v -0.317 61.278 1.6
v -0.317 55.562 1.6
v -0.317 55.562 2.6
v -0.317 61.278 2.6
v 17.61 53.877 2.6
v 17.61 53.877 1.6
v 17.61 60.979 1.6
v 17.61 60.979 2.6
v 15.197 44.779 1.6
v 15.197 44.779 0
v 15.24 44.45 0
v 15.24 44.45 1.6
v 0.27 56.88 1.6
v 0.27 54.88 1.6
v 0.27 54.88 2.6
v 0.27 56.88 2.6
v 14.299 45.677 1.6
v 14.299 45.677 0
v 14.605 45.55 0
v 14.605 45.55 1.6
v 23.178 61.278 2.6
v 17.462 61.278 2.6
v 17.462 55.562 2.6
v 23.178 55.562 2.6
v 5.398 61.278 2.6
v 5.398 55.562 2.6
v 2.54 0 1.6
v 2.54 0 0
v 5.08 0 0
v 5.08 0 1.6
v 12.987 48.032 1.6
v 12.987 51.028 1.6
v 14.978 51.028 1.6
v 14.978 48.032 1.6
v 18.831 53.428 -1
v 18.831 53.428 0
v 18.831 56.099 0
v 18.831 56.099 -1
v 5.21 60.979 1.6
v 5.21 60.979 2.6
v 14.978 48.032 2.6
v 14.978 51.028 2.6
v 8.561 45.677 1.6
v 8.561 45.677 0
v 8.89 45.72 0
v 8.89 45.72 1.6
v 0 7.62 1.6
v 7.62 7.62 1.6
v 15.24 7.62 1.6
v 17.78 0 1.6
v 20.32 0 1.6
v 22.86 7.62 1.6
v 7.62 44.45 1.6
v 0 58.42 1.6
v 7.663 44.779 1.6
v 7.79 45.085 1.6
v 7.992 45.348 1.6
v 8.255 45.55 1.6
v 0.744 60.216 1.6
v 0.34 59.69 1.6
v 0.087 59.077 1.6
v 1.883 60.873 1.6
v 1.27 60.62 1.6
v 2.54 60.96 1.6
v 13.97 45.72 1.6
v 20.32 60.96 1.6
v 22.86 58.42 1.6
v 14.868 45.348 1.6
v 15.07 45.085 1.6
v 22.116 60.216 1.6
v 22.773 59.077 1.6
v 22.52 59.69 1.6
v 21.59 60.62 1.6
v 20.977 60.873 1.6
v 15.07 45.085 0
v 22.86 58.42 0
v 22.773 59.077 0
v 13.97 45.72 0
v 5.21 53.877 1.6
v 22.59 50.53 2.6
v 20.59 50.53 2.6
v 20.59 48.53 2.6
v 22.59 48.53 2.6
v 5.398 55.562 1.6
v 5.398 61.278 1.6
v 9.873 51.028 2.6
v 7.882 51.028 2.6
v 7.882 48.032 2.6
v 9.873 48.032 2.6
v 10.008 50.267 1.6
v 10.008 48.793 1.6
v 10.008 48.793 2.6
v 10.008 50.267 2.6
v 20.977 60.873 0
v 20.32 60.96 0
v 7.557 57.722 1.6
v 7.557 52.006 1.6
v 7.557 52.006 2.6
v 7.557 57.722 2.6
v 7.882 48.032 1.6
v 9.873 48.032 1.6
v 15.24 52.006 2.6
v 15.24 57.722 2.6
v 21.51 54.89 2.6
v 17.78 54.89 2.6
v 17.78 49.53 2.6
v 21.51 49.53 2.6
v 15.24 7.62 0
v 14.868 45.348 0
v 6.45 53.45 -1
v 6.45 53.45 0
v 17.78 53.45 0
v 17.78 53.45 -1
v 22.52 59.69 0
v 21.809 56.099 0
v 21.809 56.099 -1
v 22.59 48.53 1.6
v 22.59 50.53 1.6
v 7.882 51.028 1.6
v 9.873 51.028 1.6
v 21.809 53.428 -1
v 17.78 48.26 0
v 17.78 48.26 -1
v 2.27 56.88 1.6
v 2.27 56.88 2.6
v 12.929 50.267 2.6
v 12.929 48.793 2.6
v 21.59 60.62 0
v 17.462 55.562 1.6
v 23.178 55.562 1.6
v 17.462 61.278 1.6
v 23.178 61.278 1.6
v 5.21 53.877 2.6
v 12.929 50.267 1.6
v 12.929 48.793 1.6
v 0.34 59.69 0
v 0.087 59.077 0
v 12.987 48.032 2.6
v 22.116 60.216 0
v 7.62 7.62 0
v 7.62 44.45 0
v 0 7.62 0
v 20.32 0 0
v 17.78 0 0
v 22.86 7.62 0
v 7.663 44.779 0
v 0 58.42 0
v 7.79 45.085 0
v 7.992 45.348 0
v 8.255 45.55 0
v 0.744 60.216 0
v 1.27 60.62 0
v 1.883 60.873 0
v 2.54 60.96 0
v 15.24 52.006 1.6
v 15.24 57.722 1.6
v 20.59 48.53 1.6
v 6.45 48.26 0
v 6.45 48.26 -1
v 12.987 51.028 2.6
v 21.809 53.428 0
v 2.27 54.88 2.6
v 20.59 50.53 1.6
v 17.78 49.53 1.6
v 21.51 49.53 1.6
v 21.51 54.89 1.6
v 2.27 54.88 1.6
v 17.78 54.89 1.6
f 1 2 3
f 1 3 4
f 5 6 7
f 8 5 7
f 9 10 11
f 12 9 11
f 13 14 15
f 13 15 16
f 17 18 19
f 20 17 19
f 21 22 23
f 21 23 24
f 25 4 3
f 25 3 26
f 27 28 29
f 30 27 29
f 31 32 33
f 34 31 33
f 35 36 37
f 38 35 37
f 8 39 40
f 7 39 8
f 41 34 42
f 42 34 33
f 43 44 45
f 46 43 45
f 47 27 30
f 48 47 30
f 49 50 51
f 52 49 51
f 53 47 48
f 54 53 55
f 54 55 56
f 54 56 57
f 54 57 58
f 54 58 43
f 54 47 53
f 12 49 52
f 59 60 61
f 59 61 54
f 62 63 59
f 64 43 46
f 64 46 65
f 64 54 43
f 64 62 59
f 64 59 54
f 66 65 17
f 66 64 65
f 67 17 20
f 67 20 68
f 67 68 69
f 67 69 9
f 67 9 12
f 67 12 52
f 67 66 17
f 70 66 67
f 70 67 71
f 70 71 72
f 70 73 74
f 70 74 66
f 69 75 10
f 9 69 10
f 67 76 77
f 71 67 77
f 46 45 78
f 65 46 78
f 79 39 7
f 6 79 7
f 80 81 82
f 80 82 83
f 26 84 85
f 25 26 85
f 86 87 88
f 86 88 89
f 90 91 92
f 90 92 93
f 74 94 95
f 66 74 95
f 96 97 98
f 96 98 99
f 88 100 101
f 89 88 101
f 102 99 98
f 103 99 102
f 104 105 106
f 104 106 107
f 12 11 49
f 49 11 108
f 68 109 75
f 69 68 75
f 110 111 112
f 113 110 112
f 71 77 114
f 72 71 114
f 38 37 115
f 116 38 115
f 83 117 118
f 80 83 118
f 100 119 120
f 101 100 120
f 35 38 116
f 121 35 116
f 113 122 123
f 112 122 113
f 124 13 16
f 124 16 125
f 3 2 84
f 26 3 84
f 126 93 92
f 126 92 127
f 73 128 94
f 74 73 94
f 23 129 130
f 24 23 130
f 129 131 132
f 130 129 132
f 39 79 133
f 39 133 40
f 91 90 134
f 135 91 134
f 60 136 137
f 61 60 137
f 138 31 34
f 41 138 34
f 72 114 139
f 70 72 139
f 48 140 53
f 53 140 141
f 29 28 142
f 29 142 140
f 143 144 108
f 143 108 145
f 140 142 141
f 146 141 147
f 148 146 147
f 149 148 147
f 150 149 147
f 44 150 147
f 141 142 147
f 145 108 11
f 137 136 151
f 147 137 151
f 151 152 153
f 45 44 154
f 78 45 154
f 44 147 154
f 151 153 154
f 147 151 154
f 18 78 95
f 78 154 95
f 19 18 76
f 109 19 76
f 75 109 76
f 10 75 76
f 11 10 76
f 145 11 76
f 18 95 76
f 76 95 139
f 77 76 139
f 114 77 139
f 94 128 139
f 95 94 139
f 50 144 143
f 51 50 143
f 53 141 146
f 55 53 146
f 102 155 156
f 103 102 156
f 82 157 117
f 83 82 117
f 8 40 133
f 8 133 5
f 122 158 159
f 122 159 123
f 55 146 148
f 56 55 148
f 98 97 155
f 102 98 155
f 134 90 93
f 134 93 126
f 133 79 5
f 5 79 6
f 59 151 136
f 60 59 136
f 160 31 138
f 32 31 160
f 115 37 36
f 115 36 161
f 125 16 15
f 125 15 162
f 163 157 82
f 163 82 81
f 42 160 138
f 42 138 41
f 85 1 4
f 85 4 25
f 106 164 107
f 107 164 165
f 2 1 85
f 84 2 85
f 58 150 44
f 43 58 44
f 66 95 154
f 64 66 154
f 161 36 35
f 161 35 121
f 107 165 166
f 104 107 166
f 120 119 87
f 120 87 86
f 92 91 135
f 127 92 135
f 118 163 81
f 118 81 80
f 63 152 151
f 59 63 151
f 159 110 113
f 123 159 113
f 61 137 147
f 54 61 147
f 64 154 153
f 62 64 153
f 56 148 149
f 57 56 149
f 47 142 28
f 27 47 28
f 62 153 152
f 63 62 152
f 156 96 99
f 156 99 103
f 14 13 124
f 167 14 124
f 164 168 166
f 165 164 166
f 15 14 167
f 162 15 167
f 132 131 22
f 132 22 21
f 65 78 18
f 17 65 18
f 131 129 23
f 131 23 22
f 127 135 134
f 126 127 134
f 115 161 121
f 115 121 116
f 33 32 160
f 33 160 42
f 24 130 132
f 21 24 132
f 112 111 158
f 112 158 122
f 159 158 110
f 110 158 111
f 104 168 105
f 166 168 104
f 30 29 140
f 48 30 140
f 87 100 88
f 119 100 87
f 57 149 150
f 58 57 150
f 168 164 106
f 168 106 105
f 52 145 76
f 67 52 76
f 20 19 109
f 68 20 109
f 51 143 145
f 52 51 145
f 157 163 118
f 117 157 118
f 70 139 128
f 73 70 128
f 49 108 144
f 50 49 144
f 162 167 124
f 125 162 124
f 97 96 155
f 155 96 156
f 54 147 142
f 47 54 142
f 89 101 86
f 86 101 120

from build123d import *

# Parameters (mm, degrees)
BOARD_DEPTH                             = 1.6
SKETCH2_W                               = 2
SKETCH2_H                               = 2
FIDUCIAL_1X2_1_DEPTH                    = 1
SKETCH3_W                               = 2
SKETCH3_H                               = 2
FIDUCIAL_1X2_2_DEPTH                    = 1
SKETCH5_W                               = 7.6835
SKETCH5_H                               = 5.715
MOLEX_1X3_1_DEPTH                       = 1
SKETCH6_W                               = 12.4
SKETCH6_H                               = 7.1016
SCREWTERMINAL_3_5MM_3_LOCK_007S_1_DEPTH = 1
SKETCH7_W                               = 11.33
SKETCH7_H                               = 5.19
SFE_LOGO_NAME_FLAME_1_1_DEPTH           = 1
SKETCH8_W                               = 2.9776
SKETCH8_H                               = 2.6708
OSHW_LOGO_S_1_DEPTH                     = 1
SKETCH9_W                               = 2.921
SKETCH9_H                               = 1.4732
SOT23_3_1_DEPTH                         = 1
SKETCH10_W                              = 1.9914
SKETCH10_H                              = 2.9968
F_0603_RES_1_DEPTH                      = 1
SKETCH11_W                              = 1.9914
SKETCH11_H                              = 2.9968
F_0603_RES_2_DEPTH                      = 1
SKETCH12_W                              = 5.715
SKETCH12_H                              = 5.715
STAND_OFF_1_DEPTH                       = 1
SKETCH13_W                              = 5.715
SKETCH13_H                              = 5.715
STAND_OFF_2_DEPTH                       = 1
SKETCH14_W                              = 3.73
SKETCH14_H                              = 5.36
SFE_LOGO_FLAME_2_1_DEPTH                = 1


with BuildPart() as part:
    # Sketch1 → BOARD (new body)
    with BuildSketch(Plane.XY):
        Polygon((2.54, 60.96), (1.8826, 60.873452), (1.27, 60.619705), (0.743949, 60.216051), (0.340295, 59.69), (0.086548, 59.0774), (0, 58.42), (0, 7.62), (2.54, 0), (5.08, 0), (7.62, 7.62), (7.62, 44.45), (7.663274, 44.7787), (7.790148, 45.085), (7.991974, 45.348026), (8.255, 45.549852), (8.5613, 45.676726), (8.89, 45.72), (13.97, 45.72), (14.2987, 45.676726), (14.605, 45.549852), (14.868026, 45.348026), (15.069852, 45.085), (15.196726, 44.7787), (15.24, 44.45), (15.24, 7.62), (17.78, 0), (20.32, 0), (22.86, 7.62), (22.86, 58.42), (22.773452, 59.0774), (22.519705, 59.69), (22.116051, 60.216051), (21.59, 60.619705), (20.9774, 60.873452), (20.32, 60.96), align=None)
    extrude(amount=BOARD_DEPTH)


with BuildPart() as body_2:
    # Sketch2 → FIDUCIAL-1X2-1 (new body)
    with BuildSketch(Plane.XY.offset(1.6)):
        with Locations((1.27, 55.88)):
            Rectangle(SKETCH2_W, SKETCH2_H)
    extrude(amount=FIDUCIAL_1X2_1_DEPTH)


with BuildPart() as body_3:
    # Sketch3 → FIDUCIAL-1X2-2 (new body)
    with BuildSketch(Plane.XY.offset(1.6)):
        with Locations((21.59, 49.53)):
            Rectangle(SKETCH3_W, SKETCH3_H)
    extrude(amount=FIDUCIAL_1X2_2_DEPTH)


with BuildPart() as body_4:
    # Sketch5 → MOLEX-1X3-1 (new body)
    with BuildSketch(Plane.XY.offset(1.6)):
        with Locations((11.39825, 54.864)):
            Rectangle(SKETCH5_W, SKETCH5_H)
    extrude(amount=MOLEX_1X3_1_DEPTH)


with BuildPart() as body_5:
    # Sketch6 → SCREWTERMINAL-3_5MM-3_LOCK_007S-1 (new body)
    with BuildSketch(Plane.XY.offset(1.6)):
        with Locations((11.4098, 57.4278)):
            Rectangle(SKETCH6_W, SKETCH6_H)
    extrude(amount=SCREWTERMINAL_3_5MM_3_LOCK_007S_1_DEPTH)


with BuildPart() as body_6:
    # Sketch7 → SFE_LOGO_NAME_FLAME__1-1 (new body)
    with BuildSketch(Plane.XY):
        with Locations((12.115, 50.855)):
            Rectangle(SKETCH7_W, SKETCH7_H)
    extrude(amount=-SFE_LOGO_NAME_FLAME_1_1_DEPTH)


with BuildPart() as body_7:
    # Sketch8 → OSHW-LOGO-S-1 (new body)
    with BuildSketch(Plane.XY):
        with Locations((20.32, 54.7634)):
            Rectangle(SKETCH8_W, SKETCH8_H)
    extrude(amount=-OSHW_LOGO_S_1_DEPTH)


with BuildPart() as body_8:
    # Sketch9 → SOT23-3-1 (new body)
    with BuildSketch(Plane.XY.offset(1.6)):
        with Locations((11.4681, 49.53)):
            Rectangle(SKETCH9_W, SKETCH9_H)
    extrude(amount=SOT23_3_1_DEPTH)


with BuildPart() as body_9:
    # Sketch10 → 0603-RES-1 (new body)
    with BuildSketch(Plane.XY.offset(1.6)):
        with Locations((13.9827, 49.53)):
            Rectangle(SKETCH10_W, SKETCH10_H)
    extrude(amount=F_0603_RES_1_DEPTH)


with BuildPart() as body_10:
    # Sketch11 → 0603-RES-2 (new body)
    with BuildSketch(Plane.XY.offset(1.6)):
        with Locations((8.8773, 49.53)):
            Rectangle(SKETCH11_W, SKETCH11_H)
    extrude(amount=F_0603_RES_2_DEPTH)


with BuildPart() as body_11:
    # Sketch12 → STAND-OFF-1 (new body)
    with BuildSketch(Plane.XY.offset(1.6)):
        with Locations((2.54, 58.42)):
            Rectangle(SKETCH12_W, SKETCH12_H)
    extrude(amount=STAND_OFF_1_DEPTH)


with BuildPart() as body_12:
    # Sketch13 → STAND-OFF-2 (new body)
    with BuildSketch(Plane.XY.offset(1.6)):
        with Locations((20.32, 58.42)):
            Rectangle(SKETCH13_W, SKETCH13_H)
    extrude(amount=STAND_OFF_2_DEPTH)


with BuildPart() as body_13:
    # Sketch14 → SFE_LOGO_FLAME__2-1 (new body)
    with BuildSketch(Plane.XY.offset(1.6)):
        with Locations((19.645, 52.21)):
            Rectangle(SKETCH14_W, SKETCH14_H)
    extrude(amount=SFE_LOGO_FLAME_2_1_DEPTH)


solid = Compound([part.part, body_2.part, body_3.part, body_4.part, body_5.part, body_6.part, body_7.part, body_8.part, body_9.part, body_10.part, body_11.part, body_12.part, body_13.part])
